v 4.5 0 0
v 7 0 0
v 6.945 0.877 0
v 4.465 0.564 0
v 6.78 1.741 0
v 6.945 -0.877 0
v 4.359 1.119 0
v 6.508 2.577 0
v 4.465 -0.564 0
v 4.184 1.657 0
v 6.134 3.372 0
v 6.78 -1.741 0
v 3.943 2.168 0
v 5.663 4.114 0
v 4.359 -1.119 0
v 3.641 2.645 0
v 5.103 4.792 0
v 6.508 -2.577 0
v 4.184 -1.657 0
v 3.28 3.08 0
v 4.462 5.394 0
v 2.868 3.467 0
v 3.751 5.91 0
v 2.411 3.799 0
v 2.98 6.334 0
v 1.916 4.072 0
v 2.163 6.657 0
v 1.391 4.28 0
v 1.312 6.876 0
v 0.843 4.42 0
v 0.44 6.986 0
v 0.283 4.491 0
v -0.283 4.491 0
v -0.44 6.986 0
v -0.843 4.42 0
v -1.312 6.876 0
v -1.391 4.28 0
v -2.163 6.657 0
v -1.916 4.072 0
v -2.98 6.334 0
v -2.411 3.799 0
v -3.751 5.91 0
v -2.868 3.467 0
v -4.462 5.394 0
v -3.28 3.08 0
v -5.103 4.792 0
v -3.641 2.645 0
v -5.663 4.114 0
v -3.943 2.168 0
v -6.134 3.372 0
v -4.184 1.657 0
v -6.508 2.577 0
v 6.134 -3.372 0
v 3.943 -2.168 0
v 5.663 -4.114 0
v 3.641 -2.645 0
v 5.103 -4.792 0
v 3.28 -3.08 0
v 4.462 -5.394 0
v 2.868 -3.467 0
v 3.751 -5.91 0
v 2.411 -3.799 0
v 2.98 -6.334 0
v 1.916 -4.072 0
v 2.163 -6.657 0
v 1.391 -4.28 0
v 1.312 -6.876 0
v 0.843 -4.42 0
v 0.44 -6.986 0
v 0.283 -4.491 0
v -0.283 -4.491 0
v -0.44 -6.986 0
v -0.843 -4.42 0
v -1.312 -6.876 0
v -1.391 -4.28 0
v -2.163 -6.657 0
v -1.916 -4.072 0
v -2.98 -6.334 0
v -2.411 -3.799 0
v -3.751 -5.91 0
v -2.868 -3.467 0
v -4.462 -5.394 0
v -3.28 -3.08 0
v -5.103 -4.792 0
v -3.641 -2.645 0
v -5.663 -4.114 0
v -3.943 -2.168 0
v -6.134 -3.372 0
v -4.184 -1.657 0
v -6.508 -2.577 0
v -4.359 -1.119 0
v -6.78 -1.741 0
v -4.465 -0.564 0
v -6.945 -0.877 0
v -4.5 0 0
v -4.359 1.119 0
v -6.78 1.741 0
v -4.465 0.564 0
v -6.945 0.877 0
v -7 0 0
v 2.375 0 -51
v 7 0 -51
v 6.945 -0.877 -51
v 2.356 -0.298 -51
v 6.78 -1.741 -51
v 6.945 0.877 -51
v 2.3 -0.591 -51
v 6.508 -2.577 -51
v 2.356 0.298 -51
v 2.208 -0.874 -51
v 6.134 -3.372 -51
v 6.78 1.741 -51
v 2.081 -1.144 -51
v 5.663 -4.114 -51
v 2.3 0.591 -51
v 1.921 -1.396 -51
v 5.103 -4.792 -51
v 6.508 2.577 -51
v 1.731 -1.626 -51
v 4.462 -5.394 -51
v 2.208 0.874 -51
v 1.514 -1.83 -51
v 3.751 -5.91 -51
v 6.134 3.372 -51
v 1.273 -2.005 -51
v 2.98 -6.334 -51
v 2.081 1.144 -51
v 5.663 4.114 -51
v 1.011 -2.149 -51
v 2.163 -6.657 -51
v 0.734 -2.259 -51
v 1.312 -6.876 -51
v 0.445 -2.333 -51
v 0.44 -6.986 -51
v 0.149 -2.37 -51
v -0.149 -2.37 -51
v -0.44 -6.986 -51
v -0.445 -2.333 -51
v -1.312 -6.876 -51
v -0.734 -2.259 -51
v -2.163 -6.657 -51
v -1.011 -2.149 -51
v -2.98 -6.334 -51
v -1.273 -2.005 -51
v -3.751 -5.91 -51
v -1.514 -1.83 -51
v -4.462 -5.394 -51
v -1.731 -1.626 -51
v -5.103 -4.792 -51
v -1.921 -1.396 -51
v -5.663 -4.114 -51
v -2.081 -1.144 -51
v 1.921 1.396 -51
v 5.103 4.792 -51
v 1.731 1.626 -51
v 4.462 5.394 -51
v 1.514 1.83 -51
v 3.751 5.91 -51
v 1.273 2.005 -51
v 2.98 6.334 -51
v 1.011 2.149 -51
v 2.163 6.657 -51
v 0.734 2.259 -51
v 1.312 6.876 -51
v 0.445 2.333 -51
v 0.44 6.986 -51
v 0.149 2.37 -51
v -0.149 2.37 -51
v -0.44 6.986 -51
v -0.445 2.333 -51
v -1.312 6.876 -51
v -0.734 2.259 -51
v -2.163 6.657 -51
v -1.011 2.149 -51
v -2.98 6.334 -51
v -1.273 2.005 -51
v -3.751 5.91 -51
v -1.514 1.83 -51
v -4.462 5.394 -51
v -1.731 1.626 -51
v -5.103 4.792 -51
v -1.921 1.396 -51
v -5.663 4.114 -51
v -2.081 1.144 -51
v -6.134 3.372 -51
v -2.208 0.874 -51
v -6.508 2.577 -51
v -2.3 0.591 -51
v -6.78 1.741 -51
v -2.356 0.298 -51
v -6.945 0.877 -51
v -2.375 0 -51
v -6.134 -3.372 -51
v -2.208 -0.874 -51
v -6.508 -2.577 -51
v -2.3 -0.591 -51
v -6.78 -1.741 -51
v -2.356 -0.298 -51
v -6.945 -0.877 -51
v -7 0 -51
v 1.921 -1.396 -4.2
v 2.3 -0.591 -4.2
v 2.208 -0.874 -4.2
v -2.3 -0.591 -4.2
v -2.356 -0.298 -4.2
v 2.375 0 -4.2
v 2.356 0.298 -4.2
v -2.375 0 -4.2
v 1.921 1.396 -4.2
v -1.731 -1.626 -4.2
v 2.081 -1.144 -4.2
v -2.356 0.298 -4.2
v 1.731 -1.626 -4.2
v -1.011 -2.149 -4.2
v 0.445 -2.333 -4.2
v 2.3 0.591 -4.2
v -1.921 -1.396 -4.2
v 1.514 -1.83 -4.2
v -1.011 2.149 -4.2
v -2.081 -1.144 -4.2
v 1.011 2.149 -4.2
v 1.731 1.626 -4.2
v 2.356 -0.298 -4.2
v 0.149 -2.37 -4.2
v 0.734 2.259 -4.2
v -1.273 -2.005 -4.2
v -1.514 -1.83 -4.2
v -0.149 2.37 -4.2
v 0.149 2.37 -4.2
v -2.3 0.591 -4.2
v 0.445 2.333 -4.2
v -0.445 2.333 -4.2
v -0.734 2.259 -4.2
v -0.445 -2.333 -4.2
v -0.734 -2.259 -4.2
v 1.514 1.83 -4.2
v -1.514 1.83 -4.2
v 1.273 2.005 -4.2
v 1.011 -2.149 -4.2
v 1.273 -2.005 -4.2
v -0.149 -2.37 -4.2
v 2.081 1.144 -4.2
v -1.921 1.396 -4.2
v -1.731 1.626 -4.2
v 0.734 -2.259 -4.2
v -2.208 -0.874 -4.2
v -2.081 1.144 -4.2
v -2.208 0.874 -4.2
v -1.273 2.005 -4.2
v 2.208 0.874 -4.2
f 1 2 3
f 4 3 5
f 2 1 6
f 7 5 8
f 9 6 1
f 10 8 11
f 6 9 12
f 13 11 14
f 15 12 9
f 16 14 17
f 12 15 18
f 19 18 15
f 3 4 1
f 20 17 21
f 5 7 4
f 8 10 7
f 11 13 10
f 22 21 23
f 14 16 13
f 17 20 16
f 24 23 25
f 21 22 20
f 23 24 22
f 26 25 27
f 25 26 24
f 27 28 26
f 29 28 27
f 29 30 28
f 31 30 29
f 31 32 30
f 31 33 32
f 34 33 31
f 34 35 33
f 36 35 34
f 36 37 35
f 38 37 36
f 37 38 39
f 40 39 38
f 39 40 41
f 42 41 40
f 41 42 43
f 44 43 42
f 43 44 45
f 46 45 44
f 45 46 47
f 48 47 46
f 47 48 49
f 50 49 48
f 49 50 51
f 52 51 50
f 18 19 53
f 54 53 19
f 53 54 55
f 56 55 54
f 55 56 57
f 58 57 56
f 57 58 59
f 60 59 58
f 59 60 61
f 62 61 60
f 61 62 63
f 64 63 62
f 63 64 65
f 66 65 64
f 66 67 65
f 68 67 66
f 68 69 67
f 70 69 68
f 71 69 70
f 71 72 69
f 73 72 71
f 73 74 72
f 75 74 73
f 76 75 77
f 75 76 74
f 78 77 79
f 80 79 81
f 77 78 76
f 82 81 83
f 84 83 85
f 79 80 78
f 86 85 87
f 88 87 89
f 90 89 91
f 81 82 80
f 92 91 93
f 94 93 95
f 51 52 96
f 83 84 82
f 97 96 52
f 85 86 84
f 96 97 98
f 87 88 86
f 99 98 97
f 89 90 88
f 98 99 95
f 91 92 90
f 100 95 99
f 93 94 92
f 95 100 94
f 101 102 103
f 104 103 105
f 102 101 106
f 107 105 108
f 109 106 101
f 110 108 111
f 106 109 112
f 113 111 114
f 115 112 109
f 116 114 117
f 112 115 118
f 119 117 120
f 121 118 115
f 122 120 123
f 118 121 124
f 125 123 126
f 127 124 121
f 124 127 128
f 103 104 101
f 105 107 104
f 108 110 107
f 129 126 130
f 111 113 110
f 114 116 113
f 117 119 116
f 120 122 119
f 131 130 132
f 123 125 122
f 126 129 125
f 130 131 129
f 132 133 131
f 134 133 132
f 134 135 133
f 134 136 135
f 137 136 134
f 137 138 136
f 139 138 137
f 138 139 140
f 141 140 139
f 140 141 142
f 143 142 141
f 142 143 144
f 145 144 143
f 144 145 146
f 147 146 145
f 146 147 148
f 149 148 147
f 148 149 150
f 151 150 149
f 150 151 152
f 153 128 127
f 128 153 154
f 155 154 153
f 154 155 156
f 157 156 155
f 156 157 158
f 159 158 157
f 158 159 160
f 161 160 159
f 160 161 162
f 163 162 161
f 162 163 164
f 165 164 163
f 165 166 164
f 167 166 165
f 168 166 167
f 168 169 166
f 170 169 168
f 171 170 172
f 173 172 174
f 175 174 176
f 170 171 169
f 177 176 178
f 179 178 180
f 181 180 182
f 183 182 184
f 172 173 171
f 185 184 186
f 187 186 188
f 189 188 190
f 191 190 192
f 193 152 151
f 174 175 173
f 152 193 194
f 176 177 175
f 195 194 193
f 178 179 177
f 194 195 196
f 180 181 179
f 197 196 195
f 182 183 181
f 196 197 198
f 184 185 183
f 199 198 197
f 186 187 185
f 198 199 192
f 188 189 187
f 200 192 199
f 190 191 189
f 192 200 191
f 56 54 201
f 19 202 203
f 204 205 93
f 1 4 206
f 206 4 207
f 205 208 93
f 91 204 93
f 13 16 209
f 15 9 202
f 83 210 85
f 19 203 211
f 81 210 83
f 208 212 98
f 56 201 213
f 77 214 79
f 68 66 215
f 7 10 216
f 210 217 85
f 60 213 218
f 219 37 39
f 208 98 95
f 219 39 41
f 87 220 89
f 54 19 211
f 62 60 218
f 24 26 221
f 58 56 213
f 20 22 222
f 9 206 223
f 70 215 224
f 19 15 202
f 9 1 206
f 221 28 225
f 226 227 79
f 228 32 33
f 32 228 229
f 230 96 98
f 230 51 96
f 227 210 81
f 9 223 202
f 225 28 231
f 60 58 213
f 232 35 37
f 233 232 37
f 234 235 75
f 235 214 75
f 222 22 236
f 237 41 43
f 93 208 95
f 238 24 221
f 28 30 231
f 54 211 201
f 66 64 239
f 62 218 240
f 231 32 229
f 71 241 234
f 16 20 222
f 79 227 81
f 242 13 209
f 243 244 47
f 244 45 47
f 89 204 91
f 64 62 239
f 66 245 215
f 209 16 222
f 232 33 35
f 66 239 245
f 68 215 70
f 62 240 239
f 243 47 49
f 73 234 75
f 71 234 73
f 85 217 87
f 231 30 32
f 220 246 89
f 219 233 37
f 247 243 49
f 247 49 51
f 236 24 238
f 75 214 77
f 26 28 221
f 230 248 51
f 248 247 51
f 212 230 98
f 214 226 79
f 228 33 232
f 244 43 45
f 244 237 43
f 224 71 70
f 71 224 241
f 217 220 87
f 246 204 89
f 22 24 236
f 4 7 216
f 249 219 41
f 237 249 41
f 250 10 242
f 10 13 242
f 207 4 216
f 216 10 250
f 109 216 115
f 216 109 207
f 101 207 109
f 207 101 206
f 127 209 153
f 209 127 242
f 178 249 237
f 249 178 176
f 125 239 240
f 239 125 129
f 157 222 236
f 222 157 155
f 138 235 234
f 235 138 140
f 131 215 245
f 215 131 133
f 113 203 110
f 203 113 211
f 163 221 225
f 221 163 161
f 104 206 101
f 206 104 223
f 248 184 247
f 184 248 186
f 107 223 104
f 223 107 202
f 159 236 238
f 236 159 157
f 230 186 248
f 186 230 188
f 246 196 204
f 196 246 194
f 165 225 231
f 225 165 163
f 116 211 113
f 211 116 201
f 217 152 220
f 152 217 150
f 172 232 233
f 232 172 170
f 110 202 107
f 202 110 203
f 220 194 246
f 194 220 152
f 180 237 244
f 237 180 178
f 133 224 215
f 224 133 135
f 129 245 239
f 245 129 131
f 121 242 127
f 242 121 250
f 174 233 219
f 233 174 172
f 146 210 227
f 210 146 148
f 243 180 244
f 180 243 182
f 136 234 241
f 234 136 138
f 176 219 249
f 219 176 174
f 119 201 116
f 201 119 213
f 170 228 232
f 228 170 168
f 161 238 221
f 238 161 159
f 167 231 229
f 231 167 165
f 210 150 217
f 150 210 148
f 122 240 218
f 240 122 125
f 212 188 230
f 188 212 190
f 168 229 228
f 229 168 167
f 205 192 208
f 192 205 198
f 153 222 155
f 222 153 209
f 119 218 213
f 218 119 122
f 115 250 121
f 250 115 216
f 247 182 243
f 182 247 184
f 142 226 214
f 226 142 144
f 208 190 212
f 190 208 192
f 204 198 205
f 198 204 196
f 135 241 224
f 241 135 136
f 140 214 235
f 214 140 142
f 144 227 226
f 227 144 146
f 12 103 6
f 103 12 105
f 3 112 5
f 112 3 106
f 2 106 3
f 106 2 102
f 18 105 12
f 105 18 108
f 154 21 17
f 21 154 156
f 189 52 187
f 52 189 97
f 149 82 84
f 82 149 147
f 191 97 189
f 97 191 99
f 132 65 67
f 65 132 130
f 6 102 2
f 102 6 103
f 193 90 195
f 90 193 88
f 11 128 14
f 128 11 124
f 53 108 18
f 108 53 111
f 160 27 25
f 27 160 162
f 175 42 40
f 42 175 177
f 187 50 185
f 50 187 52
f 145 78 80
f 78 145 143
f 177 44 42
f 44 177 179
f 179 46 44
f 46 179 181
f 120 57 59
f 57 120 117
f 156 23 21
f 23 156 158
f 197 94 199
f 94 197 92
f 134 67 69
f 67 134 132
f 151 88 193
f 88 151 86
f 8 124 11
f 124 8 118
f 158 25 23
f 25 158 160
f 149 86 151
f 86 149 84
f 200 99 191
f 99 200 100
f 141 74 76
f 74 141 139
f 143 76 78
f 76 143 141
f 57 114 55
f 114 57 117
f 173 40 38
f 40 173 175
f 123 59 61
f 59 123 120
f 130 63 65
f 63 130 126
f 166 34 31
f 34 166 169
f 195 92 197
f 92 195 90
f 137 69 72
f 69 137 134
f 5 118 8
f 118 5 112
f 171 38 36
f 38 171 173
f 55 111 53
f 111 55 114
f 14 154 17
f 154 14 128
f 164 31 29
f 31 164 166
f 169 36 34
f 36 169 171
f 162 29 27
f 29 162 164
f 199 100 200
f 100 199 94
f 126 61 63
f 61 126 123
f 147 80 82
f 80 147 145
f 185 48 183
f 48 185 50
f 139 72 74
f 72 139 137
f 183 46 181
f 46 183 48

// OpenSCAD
$fn = 50;


difference() {
	union() {
		translate(v = [0, 0, -51.0000000000]) {
			cylinder(h = 51, r = 7.0000000000);
		}
		cylinder(h = 0, r = 10.0000000000);
	}
	union() {
		translate(v = [0, 0, 0]) {
			rotate(a = [0, 0, 0]) {
				difference() {
					union() {
						#translate(v = [0, 0, -51.0000000000]) {
							cylinder(h = 51, r = 2.2500000000);
						}
						#translate(v = [0, 0, -4.2000000000]) {
							cylinder(h = 4.2000000000, r = 7.0000000000, r1 = 2.3750000000, r2 = 4.5000000000);
						}
						#translate(v = [0, 0, -51.0000000000]) {
							cylinder(h = 51, r = 2.3750000000);
						}
						#translate(v = [0, 0, -51.0000000000]) {
							cylinder(h = 51, r = 2.2500000000);
						}
					}
					union();
				}
			}
		}
	}
}
